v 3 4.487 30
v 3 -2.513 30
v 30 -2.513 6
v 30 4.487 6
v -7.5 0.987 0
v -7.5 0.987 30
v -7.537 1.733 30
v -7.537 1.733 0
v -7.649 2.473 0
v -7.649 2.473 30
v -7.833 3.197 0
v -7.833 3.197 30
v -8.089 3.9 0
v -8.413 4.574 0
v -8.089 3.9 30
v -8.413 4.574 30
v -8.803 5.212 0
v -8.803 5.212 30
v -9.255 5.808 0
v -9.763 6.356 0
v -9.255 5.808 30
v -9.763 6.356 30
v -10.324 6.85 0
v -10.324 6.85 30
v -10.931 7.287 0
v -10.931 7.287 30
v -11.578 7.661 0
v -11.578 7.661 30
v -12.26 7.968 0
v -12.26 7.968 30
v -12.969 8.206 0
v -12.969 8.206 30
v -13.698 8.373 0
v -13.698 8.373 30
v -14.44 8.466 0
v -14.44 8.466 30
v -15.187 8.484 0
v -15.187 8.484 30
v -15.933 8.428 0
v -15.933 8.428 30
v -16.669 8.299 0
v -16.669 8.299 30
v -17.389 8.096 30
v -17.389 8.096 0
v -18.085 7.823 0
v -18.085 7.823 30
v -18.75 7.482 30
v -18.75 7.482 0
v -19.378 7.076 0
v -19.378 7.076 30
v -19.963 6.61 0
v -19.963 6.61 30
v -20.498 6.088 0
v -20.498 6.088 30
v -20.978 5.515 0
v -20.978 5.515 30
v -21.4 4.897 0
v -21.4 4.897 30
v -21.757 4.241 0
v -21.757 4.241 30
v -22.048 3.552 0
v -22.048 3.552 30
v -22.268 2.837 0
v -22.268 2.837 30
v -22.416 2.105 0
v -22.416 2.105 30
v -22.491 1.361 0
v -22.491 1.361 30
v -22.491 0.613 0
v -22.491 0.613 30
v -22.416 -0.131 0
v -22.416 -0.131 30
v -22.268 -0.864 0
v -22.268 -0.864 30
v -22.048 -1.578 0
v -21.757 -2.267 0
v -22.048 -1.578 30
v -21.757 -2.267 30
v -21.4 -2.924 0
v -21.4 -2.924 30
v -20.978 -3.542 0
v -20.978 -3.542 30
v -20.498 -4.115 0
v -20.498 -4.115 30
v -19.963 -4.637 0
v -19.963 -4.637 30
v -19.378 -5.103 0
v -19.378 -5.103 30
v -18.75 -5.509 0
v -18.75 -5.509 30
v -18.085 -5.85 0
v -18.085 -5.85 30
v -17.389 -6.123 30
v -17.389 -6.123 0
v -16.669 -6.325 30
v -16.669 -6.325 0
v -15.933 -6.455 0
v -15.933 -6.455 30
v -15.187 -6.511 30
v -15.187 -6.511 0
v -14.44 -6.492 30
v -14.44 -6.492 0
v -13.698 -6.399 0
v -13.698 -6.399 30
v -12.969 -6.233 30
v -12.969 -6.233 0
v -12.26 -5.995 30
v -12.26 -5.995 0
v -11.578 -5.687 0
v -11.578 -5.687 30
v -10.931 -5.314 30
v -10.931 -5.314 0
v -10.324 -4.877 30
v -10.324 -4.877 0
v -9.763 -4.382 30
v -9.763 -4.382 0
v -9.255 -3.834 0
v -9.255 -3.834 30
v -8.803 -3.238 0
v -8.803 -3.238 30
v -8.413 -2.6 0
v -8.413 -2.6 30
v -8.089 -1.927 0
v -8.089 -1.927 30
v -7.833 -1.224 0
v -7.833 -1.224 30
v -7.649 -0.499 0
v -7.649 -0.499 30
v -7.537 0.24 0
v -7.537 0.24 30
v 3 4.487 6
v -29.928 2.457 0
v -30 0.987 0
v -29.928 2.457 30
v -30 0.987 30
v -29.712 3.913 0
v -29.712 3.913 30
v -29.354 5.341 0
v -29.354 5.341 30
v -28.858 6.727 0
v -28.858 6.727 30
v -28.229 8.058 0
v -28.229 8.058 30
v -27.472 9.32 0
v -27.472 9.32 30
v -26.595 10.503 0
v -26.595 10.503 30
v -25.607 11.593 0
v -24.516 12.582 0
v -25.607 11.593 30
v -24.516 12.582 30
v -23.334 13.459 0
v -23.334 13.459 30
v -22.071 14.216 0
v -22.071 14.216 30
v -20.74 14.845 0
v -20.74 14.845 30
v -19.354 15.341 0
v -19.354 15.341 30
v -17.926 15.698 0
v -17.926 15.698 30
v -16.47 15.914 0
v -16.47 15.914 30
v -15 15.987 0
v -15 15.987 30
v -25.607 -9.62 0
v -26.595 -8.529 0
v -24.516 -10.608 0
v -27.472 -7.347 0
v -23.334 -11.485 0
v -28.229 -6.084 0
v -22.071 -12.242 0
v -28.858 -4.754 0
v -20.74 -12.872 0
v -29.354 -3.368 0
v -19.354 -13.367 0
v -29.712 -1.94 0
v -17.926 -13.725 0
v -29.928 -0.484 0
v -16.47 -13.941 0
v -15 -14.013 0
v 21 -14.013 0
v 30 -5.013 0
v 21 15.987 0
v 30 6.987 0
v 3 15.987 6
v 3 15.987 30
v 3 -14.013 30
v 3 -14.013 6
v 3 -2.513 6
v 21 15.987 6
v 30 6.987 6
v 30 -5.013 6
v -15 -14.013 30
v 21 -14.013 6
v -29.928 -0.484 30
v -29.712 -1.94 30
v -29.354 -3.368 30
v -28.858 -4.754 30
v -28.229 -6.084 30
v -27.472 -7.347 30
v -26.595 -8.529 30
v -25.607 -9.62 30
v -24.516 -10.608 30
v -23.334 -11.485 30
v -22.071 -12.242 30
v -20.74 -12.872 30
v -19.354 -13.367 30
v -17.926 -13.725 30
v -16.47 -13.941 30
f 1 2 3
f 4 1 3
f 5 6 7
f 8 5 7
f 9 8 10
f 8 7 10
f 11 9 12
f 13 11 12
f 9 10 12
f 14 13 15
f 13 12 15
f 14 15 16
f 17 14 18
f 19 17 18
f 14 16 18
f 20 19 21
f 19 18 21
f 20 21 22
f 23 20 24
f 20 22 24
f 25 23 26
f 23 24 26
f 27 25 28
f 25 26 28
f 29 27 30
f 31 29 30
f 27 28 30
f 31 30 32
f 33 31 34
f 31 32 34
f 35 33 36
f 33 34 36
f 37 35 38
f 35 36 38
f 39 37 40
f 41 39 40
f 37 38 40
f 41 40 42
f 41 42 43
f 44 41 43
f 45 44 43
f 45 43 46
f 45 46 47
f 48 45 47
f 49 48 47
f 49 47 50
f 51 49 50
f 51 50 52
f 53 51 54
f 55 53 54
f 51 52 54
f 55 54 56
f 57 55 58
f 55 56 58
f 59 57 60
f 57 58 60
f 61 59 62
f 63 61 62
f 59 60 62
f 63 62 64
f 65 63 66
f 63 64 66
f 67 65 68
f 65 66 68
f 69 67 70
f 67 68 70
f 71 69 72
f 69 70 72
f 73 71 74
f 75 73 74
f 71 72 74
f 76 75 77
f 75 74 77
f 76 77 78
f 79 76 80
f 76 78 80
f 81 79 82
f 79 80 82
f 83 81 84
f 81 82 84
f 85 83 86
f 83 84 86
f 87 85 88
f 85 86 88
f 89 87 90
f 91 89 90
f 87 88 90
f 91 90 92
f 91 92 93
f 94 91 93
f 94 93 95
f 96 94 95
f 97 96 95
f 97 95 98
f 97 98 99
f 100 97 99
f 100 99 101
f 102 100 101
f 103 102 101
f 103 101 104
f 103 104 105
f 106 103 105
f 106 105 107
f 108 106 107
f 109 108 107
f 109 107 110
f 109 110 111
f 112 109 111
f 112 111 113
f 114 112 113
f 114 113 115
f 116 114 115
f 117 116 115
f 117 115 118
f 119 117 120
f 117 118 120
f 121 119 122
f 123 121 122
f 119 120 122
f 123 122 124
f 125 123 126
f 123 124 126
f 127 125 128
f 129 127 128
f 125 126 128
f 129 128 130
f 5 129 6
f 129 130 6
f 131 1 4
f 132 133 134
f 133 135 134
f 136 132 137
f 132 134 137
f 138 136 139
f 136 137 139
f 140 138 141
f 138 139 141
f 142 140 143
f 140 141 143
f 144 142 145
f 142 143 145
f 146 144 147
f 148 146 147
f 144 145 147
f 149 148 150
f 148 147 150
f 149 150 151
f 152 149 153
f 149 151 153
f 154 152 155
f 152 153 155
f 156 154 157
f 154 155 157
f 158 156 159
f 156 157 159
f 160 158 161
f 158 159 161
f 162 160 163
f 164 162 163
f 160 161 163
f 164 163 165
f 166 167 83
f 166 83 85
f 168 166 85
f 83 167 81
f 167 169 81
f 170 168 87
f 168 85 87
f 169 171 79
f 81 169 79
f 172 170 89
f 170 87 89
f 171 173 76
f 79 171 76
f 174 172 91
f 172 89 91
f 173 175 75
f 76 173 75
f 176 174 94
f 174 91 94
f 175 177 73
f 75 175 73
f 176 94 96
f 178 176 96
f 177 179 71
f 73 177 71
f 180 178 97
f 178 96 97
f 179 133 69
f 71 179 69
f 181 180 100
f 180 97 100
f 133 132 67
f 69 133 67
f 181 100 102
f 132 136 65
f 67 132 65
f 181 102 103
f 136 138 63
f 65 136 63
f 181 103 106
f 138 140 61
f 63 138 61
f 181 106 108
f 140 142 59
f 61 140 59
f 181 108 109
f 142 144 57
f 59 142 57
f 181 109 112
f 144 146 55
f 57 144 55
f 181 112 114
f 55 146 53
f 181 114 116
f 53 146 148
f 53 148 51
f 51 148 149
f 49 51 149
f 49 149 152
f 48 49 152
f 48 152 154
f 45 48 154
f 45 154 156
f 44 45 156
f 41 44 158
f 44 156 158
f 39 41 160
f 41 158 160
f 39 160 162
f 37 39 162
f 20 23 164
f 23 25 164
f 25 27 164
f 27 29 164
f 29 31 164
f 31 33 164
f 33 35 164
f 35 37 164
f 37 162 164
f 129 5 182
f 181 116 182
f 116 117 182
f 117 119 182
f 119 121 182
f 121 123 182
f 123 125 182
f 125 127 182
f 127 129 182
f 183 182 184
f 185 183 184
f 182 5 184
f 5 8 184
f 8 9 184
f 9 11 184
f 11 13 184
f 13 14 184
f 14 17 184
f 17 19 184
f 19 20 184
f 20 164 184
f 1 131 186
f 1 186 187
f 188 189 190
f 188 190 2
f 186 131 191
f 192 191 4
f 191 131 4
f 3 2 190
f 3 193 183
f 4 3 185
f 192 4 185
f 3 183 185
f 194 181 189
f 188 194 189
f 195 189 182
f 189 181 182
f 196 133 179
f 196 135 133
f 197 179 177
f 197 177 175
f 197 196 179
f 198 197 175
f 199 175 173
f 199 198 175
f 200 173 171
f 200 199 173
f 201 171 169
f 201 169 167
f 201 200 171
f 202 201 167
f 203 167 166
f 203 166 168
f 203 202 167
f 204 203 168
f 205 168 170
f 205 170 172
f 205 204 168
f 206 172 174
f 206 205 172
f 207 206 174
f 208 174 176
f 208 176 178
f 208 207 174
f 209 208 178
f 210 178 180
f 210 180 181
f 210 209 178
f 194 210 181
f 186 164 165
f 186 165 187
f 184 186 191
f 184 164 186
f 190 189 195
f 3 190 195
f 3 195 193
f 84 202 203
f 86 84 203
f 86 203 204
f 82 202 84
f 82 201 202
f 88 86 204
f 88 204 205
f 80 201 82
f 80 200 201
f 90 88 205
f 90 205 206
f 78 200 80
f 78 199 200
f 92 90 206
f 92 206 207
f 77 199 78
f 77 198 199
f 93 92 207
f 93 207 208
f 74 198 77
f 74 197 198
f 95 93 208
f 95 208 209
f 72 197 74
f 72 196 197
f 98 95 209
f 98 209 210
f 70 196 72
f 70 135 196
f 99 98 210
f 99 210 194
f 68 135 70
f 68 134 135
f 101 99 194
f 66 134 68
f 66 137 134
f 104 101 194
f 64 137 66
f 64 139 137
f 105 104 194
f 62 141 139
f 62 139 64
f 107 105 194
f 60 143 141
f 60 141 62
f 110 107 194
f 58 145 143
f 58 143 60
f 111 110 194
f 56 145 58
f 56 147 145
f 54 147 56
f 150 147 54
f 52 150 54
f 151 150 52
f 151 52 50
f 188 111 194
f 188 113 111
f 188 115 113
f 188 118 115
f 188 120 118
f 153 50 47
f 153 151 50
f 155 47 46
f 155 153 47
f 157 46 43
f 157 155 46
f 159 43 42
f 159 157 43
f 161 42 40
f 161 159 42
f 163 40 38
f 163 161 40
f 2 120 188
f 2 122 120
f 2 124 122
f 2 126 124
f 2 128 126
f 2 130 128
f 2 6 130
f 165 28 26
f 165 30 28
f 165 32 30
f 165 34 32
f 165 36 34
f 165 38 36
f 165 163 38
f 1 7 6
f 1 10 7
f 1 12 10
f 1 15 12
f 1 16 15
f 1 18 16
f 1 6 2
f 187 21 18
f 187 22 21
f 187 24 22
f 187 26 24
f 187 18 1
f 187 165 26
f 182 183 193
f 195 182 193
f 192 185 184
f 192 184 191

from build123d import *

# Parameters (mm, degrees)
F0_W      = 60
F0_H      = 30
F1_DEPTH  = 30
F2_R      = 14.99999
F3_SIZE   = 9
F4_R      = 7.5
F5_DEPTH  = 30
F6_W      = 9
F6_H      = 24
F6_W_2    = 18
F7_DEPTH  = 11.5
F8_START  = -18.5
F6_W_3    = 27
F8_DEPTH  = 11.501
F10_DEPTH = 7


# Not quite as in the source:
# - a fillet or chamfer is up to 0.001 mm smaller than in the source, because OpenCascade refuses the exact size


with BuildPart() as f1:
    # F0 (on Top) → F1 (new body)
    with BuildSketch(Plane.XY):
        with Locations((0, 0.9866876062)):
            Rectangle(F0_W, F0_H)
    extrude(amount=F1_DEPTH)

    # F2 (radius 15 in the source; OpenCascade refuses exactly that, so slightly less here)
    f2_edges = [f1.edges().sort_by_distance(p)[0] for p in [
        (-30, -14.013312, 15),
        (-30, 15.986688, 15),
    ]]
    fillet(f2_edges, radius=F2_R)

    # F3
    f3_edges = [f1.edges().sort_by_distance(p)[0] for p in [
        (30, -14.013312, 15),
        (30, 15.986688, 15),
    ]]
    chamfer(f3_edges, length=F3_SIZE)

    # F4 (on face) → F5 (cut, through all)
    with BuildSketch(Plane.XY.offset(30)):
        with Locations((-15, 0.9866876062)):
            Circle(F4_R)
    extrude(amount=-F5_DEPTH, mode=Mode.SUBTRACT)

    # F6 (on face) → F7 (cut)
    with BuildSketch(Plane.XZ.offset(14.0133123938)):
        with Locations((25.5, 18)):
            Rectangle(F6_W, F6_H)
        with Locations((12, 18)):
            Rectangle(F6_W_2, F6_H)
    extrude(amount=-F7_DEPTH, mode=Mode.SUBTRACT)

    # F6 (on face) → F8 (cut)
    with BuildSketch(Plane.XZ.offset(14.0133123938).offset(F8_START)):
        with Locations((16.5, 18)):
            Rectangle(F6_W_3, F6_H)
    extrude(amount=-F8_DEPTH, mode=Mode.SUBTRACT)

    # F9 (on face) → F10 (cut, through all)
    with BuildSketch(Plane.XZ.offset(2.5133123938)):
        Polygon((3, 30), (30, 6), (30, 30), align=None)
    extrude(amount=-F10_DEPTH, mode=Mode.SUBTRACT)


solid = f1.part
